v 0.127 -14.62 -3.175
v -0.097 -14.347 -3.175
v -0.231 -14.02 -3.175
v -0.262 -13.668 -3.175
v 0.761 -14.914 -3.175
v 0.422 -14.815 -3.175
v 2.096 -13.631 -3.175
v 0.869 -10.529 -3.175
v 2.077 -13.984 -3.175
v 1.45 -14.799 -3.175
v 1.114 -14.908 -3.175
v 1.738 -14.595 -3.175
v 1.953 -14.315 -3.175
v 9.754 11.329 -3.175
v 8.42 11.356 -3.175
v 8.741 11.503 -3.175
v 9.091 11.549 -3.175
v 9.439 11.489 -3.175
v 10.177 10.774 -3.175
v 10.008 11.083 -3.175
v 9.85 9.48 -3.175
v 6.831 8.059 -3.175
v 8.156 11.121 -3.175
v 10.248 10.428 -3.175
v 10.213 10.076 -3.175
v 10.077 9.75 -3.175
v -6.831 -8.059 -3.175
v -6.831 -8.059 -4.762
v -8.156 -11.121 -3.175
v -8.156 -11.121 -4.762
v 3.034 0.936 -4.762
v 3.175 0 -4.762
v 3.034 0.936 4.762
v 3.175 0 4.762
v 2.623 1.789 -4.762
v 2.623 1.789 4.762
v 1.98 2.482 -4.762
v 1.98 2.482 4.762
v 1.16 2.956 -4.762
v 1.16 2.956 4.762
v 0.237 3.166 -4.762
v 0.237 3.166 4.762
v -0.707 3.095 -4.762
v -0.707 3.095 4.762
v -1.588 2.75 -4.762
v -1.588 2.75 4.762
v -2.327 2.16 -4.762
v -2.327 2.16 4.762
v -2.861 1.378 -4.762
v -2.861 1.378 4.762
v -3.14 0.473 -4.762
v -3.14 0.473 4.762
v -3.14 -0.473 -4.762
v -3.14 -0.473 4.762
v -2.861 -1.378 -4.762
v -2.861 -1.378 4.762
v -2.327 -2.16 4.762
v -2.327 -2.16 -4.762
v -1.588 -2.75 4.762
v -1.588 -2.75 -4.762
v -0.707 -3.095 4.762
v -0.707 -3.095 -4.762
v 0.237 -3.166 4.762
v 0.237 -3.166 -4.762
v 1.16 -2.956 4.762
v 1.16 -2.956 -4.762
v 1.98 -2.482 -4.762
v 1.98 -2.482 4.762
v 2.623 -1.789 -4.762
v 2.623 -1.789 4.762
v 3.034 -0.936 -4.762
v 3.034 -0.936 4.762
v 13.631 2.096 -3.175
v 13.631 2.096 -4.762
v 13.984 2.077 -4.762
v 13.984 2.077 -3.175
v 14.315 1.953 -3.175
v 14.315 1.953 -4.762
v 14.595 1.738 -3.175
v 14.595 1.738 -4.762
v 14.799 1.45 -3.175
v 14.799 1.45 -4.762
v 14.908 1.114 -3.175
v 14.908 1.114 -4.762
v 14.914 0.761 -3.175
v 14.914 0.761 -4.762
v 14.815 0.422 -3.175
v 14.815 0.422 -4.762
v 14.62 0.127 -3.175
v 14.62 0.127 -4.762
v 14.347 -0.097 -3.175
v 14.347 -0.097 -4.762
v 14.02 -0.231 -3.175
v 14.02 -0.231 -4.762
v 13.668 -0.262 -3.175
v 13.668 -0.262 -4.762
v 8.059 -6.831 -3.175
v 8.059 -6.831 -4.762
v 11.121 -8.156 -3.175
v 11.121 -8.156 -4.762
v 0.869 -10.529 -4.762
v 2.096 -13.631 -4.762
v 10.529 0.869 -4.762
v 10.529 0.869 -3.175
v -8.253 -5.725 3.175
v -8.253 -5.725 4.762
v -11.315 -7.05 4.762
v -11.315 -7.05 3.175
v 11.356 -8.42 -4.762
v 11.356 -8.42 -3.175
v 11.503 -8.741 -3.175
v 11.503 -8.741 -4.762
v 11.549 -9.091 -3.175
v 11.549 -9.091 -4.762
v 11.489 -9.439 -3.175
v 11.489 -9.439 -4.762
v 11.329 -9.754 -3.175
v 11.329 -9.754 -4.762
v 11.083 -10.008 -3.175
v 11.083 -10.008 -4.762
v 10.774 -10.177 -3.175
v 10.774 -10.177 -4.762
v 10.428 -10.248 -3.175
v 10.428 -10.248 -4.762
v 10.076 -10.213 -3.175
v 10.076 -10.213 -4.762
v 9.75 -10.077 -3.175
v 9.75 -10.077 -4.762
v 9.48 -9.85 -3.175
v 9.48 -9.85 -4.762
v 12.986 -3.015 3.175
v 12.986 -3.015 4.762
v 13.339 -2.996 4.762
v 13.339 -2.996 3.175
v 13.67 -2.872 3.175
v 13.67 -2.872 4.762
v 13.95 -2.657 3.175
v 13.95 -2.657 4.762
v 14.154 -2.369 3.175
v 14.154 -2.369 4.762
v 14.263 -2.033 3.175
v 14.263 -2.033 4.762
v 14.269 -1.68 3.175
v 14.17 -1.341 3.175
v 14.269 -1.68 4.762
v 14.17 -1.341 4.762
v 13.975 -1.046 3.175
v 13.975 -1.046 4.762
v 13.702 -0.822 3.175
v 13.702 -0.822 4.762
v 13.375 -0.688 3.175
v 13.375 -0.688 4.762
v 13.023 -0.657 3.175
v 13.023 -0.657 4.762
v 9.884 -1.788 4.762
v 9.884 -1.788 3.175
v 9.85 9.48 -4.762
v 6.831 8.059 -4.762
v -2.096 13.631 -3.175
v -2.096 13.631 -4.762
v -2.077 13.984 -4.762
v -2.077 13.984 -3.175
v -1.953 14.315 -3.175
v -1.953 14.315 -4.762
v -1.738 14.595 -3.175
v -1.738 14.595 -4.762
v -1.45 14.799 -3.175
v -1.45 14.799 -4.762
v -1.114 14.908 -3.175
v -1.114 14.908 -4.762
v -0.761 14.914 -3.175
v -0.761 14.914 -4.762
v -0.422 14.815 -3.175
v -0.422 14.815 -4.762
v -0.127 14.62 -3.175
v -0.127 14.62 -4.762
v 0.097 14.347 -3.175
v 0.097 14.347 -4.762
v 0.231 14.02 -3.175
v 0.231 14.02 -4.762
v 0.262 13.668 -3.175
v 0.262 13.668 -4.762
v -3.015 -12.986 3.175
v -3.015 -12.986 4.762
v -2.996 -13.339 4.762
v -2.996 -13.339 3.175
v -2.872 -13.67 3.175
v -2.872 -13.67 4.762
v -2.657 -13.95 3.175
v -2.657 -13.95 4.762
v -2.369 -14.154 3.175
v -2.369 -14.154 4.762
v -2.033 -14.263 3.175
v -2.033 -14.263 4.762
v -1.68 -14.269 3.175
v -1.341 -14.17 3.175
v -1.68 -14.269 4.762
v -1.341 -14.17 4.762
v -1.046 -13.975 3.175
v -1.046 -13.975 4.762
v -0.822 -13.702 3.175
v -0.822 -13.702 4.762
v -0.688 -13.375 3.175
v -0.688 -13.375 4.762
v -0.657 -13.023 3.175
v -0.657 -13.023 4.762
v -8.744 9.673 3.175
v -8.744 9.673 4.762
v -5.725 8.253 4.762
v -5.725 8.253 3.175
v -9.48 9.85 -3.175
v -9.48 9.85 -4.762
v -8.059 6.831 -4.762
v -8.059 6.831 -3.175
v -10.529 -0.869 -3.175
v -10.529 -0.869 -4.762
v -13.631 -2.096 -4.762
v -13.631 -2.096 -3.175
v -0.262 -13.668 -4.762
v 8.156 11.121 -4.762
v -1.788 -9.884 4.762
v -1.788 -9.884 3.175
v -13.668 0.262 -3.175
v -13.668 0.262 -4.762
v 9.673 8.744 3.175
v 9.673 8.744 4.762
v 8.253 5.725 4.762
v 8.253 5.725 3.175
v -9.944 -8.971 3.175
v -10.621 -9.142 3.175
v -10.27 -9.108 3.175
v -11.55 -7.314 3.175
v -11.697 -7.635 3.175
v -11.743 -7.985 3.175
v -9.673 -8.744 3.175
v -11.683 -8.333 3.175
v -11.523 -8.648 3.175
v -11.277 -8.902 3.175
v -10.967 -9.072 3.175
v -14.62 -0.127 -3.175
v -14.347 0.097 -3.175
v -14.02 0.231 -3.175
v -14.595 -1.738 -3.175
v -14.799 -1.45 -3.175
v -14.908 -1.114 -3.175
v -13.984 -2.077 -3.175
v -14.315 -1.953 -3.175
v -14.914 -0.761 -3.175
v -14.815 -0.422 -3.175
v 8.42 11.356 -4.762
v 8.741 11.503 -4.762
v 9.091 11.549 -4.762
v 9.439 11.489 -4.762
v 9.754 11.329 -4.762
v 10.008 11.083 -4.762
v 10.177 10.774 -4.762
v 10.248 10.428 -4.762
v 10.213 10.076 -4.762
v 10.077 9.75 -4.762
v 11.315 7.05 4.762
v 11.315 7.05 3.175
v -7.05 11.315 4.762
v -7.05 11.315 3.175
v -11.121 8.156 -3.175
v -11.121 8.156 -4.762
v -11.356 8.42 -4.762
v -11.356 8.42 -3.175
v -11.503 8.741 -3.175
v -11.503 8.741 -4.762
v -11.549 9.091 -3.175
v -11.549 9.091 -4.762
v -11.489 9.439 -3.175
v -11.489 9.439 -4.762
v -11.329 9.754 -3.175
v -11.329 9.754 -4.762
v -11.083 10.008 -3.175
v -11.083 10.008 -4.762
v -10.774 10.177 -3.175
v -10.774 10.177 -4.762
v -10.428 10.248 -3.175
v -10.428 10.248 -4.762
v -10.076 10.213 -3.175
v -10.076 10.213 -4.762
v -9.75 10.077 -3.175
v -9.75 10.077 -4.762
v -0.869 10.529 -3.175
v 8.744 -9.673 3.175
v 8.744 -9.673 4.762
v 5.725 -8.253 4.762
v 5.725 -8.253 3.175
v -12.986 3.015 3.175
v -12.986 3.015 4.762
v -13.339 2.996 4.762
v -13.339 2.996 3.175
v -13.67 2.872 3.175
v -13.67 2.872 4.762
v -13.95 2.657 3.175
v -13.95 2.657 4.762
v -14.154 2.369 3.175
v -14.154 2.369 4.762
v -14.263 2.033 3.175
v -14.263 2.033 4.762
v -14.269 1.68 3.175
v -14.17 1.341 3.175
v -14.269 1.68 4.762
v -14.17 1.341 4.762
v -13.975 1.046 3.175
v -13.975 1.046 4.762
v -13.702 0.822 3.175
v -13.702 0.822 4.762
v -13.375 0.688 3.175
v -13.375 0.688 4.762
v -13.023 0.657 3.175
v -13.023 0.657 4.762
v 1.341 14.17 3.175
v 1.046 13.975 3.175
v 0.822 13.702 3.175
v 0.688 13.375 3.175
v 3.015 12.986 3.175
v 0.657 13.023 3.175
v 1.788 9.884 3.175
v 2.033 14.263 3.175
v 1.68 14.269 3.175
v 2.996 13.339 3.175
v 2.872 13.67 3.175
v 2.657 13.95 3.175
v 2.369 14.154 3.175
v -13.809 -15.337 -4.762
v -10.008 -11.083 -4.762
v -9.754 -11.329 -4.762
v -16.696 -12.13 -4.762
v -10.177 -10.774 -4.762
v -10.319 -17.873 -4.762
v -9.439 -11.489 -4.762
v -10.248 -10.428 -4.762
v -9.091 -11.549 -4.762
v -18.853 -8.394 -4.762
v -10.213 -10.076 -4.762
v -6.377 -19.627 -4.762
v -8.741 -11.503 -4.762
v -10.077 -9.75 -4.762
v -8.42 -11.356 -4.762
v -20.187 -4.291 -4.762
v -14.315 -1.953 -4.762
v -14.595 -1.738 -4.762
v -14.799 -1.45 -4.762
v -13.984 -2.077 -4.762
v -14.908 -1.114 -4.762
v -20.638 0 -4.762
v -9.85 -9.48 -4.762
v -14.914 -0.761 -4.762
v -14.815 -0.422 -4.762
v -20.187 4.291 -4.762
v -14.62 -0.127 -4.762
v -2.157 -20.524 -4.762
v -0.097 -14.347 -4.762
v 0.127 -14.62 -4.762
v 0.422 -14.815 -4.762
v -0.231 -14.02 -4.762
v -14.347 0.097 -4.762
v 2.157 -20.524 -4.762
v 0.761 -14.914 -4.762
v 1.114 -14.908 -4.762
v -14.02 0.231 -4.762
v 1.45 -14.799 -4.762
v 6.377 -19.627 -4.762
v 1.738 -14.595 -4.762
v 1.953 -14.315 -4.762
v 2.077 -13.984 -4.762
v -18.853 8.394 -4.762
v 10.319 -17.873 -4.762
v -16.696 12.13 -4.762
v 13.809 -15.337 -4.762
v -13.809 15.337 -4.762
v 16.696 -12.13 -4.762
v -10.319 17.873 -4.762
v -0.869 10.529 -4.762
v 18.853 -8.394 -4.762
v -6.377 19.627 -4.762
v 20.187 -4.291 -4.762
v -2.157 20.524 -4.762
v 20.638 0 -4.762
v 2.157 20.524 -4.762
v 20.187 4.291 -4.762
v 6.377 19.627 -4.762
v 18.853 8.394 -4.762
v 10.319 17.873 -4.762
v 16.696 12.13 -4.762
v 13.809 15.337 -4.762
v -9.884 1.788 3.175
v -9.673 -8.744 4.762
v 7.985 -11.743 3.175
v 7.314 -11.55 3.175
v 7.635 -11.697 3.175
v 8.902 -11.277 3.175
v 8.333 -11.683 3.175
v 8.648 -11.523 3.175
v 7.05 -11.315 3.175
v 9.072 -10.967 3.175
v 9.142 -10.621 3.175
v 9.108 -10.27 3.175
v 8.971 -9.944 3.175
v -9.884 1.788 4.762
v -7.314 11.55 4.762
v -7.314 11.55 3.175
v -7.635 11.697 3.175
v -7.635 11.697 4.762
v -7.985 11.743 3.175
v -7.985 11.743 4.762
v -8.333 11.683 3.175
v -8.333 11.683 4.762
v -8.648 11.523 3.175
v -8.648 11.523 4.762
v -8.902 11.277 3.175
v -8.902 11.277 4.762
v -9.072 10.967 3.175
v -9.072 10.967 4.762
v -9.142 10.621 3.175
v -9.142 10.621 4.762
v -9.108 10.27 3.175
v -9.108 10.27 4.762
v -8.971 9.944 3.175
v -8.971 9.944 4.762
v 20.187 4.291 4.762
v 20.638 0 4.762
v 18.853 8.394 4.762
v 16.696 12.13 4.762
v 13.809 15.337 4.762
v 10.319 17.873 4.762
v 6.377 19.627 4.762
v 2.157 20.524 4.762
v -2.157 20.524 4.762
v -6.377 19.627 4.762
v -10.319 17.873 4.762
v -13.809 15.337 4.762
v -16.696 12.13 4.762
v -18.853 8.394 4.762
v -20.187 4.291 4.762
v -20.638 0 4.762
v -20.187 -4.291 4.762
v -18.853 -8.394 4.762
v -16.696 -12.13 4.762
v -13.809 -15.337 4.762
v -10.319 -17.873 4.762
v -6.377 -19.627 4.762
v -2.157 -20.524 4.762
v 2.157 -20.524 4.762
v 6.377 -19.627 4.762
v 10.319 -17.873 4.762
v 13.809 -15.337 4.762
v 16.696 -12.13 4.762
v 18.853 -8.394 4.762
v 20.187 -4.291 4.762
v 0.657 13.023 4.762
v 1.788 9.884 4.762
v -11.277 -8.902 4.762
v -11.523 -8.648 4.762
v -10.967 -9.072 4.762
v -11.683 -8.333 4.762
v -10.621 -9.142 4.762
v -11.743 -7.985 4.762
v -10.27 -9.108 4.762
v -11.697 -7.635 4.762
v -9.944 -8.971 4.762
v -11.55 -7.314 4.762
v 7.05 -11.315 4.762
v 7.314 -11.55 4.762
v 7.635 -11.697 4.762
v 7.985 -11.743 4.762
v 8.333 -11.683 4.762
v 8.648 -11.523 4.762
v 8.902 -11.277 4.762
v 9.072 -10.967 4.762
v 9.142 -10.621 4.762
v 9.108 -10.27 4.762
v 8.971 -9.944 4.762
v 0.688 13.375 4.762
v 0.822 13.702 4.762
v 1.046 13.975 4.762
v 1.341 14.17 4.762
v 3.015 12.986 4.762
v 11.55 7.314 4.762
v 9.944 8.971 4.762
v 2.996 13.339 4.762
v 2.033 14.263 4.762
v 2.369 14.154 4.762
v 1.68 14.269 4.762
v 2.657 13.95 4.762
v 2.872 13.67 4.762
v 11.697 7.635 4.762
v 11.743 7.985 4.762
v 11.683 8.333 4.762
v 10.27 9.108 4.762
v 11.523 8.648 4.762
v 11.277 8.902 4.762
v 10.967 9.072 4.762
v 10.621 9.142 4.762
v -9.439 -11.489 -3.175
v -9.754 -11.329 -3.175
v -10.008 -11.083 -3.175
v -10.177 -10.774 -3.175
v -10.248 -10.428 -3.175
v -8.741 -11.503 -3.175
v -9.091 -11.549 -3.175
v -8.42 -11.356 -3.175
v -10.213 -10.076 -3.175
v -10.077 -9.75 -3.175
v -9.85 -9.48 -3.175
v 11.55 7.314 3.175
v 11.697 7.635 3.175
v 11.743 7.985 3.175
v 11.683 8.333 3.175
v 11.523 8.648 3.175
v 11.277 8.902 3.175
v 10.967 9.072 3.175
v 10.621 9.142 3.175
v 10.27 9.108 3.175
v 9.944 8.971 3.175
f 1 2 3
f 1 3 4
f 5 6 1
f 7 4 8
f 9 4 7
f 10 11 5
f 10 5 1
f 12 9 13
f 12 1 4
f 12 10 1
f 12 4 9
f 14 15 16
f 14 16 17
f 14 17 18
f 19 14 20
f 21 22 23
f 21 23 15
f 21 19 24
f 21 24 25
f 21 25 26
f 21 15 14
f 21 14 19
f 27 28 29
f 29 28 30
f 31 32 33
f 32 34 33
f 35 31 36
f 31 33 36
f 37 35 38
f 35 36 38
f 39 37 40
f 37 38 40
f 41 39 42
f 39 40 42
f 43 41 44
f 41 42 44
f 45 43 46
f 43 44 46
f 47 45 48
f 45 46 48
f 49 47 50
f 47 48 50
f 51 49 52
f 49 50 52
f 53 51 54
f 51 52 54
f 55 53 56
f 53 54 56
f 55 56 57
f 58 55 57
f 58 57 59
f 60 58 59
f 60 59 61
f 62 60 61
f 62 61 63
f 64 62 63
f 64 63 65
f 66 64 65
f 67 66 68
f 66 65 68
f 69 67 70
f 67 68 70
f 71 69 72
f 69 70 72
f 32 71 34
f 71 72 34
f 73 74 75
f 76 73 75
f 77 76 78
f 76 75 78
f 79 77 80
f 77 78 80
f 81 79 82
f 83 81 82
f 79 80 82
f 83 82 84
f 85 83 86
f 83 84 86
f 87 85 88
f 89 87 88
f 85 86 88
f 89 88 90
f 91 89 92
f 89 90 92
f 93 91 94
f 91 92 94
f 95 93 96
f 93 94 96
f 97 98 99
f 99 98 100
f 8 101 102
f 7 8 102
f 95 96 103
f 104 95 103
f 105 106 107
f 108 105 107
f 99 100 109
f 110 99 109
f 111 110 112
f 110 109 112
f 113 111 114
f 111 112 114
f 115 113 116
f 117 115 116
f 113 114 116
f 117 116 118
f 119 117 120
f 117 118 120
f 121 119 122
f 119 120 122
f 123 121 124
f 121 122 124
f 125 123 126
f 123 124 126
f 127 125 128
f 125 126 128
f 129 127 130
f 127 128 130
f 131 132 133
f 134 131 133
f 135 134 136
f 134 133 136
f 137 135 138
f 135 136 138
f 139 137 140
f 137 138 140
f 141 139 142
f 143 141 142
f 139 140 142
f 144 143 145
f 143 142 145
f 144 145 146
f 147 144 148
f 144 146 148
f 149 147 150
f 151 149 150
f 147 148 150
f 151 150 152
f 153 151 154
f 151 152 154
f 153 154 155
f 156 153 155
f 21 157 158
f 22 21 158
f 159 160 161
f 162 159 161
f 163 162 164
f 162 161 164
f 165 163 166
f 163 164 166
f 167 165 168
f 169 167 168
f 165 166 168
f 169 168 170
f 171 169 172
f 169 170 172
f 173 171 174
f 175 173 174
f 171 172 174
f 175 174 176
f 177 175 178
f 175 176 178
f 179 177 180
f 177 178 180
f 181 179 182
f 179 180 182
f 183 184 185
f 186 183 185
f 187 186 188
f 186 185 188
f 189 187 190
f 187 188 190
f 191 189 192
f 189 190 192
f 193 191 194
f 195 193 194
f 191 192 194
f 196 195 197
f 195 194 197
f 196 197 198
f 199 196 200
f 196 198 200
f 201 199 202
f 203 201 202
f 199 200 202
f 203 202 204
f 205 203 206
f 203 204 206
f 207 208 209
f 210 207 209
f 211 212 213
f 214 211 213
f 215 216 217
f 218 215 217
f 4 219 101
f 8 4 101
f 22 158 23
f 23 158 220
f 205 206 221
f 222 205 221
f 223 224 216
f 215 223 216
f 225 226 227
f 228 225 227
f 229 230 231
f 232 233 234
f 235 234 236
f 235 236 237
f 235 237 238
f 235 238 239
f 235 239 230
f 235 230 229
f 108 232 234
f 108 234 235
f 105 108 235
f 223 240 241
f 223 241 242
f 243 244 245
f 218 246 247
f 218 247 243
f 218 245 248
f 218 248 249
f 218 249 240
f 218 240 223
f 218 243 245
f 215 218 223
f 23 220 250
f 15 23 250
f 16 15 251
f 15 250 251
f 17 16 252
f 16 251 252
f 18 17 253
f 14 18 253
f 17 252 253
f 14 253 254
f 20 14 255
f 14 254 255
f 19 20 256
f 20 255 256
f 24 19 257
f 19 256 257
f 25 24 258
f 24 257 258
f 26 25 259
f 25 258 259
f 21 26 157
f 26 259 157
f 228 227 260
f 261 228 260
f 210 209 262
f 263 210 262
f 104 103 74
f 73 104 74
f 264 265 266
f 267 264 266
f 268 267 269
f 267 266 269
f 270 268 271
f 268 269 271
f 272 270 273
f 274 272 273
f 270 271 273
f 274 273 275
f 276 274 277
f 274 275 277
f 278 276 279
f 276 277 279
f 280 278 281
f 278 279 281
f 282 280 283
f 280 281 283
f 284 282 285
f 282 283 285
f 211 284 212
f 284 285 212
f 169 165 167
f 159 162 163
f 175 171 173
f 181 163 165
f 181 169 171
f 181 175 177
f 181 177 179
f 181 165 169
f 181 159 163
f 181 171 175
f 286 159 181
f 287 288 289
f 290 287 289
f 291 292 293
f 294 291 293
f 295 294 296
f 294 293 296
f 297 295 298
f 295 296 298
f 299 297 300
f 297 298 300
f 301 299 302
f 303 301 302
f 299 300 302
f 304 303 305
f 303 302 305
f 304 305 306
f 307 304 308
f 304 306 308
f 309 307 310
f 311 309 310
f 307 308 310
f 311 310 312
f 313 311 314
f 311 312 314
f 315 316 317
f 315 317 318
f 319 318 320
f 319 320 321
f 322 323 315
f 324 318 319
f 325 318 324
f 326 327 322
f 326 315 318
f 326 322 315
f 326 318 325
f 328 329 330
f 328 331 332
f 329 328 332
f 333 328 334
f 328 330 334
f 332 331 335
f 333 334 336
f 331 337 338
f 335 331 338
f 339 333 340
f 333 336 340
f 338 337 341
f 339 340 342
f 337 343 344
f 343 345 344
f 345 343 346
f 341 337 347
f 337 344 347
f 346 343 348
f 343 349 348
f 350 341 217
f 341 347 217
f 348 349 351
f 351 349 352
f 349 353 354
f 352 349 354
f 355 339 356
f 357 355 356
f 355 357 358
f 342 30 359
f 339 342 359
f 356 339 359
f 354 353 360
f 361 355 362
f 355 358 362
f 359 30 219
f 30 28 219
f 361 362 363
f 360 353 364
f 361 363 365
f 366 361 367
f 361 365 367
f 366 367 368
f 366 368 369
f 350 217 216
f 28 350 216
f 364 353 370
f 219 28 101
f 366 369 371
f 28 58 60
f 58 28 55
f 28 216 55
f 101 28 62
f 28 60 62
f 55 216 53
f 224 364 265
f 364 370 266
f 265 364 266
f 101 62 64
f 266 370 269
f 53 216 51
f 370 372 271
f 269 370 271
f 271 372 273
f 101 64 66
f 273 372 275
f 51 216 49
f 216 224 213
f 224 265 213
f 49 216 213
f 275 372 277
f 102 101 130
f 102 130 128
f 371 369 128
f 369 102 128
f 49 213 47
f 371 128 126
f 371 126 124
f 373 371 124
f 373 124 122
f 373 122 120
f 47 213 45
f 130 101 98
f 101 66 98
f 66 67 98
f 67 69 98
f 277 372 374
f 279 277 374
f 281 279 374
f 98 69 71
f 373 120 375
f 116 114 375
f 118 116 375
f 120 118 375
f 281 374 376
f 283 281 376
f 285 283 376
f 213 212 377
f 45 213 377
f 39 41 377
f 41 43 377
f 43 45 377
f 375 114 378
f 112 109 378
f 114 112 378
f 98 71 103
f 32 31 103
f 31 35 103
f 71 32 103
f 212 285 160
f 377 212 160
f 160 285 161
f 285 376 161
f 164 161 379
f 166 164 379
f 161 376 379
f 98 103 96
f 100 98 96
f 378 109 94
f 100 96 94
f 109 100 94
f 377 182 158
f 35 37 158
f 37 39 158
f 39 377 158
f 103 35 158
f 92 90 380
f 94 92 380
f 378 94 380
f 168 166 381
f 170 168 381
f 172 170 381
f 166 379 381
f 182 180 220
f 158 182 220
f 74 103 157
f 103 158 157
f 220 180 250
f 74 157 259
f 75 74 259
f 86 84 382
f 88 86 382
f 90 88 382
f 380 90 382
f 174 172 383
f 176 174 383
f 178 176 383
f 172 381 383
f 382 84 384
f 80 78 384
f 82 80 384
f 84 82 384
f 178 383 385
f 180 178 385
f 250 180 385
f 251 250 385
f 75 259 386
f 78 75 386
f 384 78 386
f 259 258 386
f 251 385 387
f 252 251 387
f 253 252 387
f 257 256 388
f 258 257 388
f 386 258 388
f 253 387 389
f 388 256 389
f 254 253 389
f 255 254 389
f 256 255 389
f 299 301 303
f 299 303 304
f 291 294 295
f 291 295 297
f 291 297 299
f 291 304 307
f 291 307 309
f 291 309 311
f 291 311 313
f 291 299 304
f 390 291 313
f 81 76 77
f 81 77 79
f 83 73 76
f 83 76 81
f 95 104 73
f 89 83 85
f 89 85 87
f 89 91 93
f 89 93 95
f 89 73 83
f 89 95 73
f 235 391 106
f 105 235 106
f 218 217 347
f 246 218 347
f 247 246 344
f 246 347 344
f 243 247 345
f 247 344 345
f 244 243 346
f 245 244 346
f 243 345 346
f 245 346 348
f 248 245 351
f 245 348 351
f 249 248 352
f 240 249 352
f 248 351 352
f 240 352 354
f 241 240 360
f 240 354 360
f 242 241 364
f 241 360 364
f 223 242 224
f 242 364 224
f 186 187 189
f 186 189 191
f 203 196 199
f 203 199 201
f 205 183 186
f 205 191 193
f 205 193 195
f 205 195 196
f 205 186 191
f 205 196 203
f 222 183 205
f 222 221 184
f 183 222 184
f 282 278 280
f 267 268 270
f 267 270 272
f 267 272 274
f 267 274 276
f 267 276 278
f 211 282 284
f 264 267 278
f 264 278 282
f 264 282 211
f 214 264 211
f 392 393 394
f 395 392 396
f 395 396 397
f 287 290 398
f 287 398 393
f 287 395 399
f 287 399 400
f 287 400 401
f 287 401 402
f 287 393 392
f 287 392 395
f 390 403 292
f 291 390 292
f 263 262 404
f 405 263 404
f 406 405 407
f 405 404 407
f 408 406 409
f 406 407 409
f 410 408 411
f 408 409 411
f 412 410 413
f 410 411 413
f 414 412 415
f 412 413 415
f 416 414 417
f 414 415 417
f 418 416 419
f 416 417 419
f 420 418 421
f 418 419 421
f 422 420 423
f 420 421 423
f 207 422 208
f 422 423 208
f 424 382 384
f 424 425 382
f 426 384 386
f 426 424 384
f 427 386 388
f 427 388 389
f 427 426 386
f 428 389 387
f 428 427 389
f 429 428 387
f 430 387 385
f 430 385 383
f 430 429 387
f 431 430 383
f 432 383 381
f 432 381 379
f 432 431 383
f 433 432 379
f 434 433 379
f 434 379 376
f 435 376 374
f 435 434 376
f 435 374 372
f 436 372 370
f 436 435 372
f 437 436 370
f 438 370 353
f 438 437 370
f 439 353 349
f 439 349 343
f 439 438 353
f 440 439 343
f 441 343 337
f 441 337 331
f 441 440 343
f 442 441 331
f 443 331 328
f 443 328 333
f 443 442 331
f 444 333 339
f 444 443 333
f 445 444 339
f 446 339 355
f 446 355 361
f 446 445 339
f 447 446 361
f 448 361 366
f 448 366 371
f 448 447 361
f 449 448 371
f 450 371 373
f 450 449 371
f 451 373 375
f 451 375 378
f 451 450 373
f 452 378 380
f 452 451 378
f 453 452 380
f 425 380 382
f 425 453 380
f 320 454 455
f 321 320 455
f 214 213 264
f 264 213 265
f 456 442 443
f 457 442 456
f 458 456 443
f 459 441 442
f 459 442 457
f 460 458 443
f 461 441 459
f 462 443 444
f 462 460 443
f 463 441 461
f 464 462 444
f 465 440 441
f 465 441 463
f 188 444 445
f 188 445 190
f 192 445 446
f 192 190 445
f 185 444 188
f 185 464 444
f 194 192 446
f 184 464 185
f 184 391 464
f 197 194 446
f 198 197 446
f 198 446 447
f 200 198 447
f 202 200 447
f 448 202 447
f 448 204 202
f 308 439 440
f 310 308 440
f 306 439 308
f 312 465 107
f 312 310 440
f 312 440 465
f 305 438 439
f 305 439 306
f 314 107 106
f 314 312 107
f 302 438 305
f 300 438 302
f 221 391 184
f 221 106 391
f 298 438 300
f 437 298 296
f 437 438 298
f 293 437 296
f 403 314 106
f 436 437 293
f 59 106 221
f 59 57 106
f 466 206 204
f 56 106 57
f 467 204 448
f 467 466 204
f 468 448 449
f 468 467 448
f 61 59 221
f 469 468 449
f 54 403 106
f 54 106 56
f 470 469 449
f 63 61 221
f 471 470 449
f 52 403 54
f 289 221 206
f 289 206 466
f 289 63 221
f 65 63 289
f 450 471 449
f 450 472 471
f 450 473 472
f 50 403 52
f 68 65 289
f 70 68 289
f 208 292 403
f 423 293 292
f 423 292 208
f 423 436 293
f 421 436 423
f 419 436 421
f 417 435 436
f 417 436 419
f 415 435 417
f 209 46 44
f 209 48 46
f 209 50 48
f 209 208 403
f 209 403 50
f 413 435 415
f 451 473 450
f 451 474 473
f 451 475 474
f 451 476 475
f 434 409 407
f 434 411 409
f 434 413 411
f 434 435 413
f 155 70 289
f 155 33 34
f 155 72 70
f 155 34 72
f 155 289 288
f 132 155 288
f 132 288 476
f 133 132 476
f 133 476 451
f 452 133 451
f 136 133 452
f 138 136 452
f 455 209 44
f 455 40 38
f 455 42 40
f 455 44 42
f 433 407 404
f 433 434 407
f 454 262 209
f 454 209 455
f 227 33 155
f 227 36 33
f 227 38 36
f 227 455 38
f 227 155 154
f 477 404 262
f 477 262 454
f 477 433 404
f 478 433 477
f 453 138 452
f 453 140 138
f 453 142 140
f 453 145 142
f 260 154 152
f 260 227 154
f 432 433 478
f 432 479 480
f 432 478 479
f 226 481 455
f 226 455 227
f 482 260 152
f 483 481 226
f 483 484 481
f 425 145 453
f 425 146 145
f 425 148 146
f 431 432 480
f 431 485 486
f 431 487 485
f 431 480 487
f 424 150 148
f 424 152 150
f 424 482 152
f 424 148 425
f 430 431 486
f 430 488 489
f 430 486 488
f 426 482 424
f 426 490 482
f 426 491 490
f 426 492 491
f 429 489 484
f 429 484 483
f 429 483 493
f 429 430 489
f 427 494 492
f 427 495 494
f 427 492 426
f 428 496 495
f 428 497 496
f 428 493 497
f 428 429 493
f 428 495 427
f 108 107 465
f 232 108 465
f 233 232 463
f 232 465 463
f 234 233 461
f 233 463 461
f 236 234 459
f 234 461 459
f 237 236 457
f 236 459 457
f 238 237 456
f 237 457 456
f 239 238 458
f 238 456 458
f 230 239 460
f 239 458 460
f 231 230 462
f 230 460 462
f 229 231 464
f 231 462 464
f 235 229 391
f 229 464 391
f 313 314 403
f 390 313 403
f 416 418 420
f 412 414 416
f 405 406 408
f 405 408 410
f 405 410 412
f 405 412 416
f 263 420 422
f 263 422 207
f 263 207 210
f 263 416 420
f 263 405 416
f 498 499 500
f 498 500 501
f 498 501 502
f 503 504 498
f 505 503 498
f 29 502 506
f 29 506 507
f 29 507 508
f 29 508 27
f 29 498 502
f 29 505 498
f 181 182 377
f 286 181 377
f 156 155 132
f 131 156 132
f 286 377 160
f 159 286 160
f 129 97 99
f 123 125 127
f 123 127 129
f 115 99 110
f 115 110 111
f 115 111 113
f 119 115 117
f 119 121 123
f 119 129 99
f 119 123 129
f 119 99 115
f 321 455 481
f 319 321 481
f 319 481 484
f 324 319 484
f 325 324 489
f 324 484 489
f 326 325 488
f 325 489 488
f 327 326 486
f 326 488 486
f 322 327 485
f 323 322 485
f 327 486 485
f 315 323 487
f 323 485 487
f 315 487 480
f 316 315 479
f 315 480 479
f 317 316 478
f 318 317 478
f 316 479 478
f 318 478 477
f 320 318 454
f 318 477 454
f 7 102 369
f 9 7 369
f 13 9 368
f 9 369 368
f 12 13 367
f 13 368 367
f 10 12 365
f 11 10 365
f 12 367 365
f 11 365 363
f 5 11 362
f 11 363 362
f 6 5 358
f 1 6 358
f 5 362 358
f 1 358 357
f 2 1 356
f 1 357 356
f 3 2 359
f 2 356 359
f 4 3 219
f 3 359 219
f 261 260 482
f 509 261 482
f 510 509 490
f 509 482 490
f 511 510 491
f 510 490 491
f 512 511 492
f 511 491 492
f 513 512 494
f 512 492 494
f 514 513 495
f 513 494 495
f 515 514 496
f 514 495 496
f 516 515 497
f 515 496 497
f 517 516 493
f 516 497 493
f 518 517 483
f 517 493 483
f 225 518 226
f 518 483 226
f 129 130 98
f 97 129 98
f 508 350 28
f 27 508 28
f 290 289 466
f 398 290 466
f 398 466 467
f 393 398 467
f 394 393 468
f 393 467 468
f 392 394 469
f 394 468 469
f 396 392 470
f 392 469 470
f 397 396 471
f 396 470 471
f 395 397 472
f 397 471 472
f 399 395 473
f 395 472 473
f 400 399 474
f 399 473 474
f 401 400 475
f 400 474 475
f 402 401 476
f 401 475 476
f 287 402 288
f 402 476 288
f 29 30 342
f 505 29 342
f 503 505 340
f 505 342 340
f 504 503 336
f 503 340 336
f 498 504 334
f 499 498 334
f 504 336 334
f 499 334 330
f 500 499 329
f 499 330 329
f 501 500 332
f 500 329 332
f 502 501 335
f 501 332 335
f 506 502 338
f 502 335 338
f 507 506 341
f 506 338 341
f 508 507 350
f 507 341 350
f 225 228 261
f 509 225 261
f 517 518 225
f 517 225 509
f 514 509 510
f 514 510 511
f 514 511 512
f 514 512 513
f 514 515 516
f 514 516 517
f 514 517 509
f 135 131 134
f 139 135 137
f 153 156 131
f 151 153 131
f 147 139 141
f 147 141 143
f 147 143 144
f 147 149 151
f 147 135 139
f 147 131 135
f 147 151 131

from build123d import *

# Parameters (mm, degrees)
F0_R     = 20.6375
F1_DEPTH = 4.7625
F2_R     = 3.175
F4_DEPTH = 12.7
F5_DEPTH = 1.5875
F7_DEPTH = 1.5875


with BuildPart() as f1:
    # F0 (on Top) → F1 (new body, symmetric)
    with BuildSketch(Plane.XY):
        Circle(F0_R)
    extrude(amount=F1_DEPTH, both=True)

    # F2 (on Top) → F4 (cut, symmetric)
    with BuildSketch(Plane.XY):
        Circle(F2_R)
    extrude(amount=F4_DEPTH, both=True, mode=Mode.SUBTRACT)

    # F3 (on face) → F5 (cut)
    with BuildSketch(Plane.XY.offset(4.7625)):
        with BuildLine():
            Line((-5.724748, 8.25276), (-7.050308, 11.314797))
            ThreePointArc((-7.050308, 11.314797), (-8.78422, 11.409519), (-8.743804, 9.673492))
            Line((-8.743804, 9.673492), (-5.724748, 8.25276))
        make_face()
        with BuildLine():
            Line((-9.883591, 1.787574), (-12.98609, 3.015449))
            ThreePointArc((-12.98609, 3.015449), (-14.27913, 1.856367), (-13.022995, 0.657388))
            Line((-13.022995, 0.657388), (-9.883591, 1.787574))
        make_face()
        with BuildLine():
            Line((-8.25276, -5.724748), (-11.314797, -7.050308))
            ThreePointArc((-11.314797, -7.050308), (-11.409519, -8.78422), (-9.673492, -8.743804))
            Line((-9.673492, -8.743804), (-8.25276, -5.724748))
        make_face()
        with BuildLine():
            Line((-1.787574, -9.883591), (-3.015449, -12.98609))
            ThreePointArc((-3.015449, -12.98609), (-1.856367, -14.27913), (-0.657388, -13.022995))
            Line((-0.657388, -13.022995), (-1.787574, -9.883591))
        make_face()
        with BuildLine():
            Line((5.724748, -8.25276), (7.050308, -11.314797))
            ThreePointArc((7.050308, -11.314797), (8.78422, -11.409519), (8.743804, -9.673492))
            Line((8.743804, -9.673492), (5.724748, -8.25276))
        make_face()
        with BuildLine():
            Line((9.883591, -1.787574), (12.98609, -3.015449))
            ThreePointArc((12.98609, -3.015449), (14.27913, -1.856367), (13.022995, -0.657388))
            Line((13.022995, -0.657388), (9.883591, -1.787574))
        make_face()
        with BuildLine():
            Line((8.25276, 5.724748), (11.314797, 7.050308))
            ThreePointArc((11.314797, 7.050308), (11.409519, 8.78422), (9.673492, 8.743804))
            Line((9.673492, 8.743804), (8.25276, 5.724748))
        make_face()
        with BuildLine():
            Line((1.787574, 9.883591), (3.015449, 12.98609))
            ThreePointArc((3.015449, 12.98609), (1.856367, 14.27913), (0.657388, 13.022995))
            Line((0.657388, 13.022995), (1.787574, 9.883591))
        make_face()
    extrude(amount=-F5_DEPTH, mode=Mode.SUBTRACT)

    # F6 (on face) → F7 (cut)
    with BuildSketch(Plane(origin=(0, 0, -4.7625), x_dir=(1, 0, 0), z_dir=(0, 0, -1))):
        with BuildLine():
            Line((-6.830625, 8.059029), (-8.156184, 11.121066))
            ThreePointArc((-8.156184, 11.121066), (-9.890096, 11.215789), (-9.849681, 9.479761))
            Line((-9.849681, 9.479761), (-6.830625, 8.059029))
        make_face()
        with BuildLine():
            Line((-10.528575, 0.868613), (-13.631074, 2.096489))
            ThreePointArc((-13.631074, 2.096489), (-14.924114, 0.937406), (-13.66798, -0.261572))
            Line((-13.66798, -0.261572), (-10.528575, 0.868613))
        make_face()
        with BuildLine():
            Line((-8.059029, -6.830625), (-11.121066, -8.156184))
            ThreePointArc((-11.121066, -8.156184), (-11.215789, -9.890096), (-9.479761, -9.849681))
            Line((-9.479761, -9.849681), (-8.059029, -6.830625))
        make_face()
        with BuildLine():
            Line((-0.868613, -10.528575), (-2.096489, -13.631074))
            ThreePointArc((-2.096489, -13.631074), (-0.937406, -14.924114), (0.261572, -13.66798))
            Line((0.261572, -13.66798), (-0.868613, -10.528575))
        make_face()
        with BuildLine():
            Line((6.830625, -8.059029), (8.156184, -11.121066))
            ThreePointArc((8.156184, -11.121066), (9.890096, -11.215789), (9.849681, -9.479761))
            Line((9.849681, -9.479761), (6.830625, -8.059029))
        make_face()
        with BuildLine():
            Line((10.528575, -0.868613), (13.631074, -2.096489))
            ThreePointArc((13.631074, -2.096489), (14.924114, -0.937406), (13.66798, 0.261572))
            Line((13.66798, 0.261572), (10.528575, -0.868613))
        make_face()
        with BuildLine():
            Line((8.059029, 6.830625), (11.121066, 8.156184))
            ThreePointArc((11.121066, 8.156184), (11.215789, 9.890096), (9.479761, 9.849681))
            Line((9.479761, 9.849681), (8.059029, 6.830625))
        make_face()
        with BuildLine():
            Line((0.868613, 10.528575), (2.096489, 13.631074))
            ThreePointArc((2.096489, 13.631074), (0.937406, 14.924114), (-0.261572, 13.66798))
            Line((-0.261572, 13.66798), (0.868613, 10.528575))
        make_face()
    extrude(amount=-F7_DEPTH, mode=Mode.SUBTRACT)


solid = f1.part
